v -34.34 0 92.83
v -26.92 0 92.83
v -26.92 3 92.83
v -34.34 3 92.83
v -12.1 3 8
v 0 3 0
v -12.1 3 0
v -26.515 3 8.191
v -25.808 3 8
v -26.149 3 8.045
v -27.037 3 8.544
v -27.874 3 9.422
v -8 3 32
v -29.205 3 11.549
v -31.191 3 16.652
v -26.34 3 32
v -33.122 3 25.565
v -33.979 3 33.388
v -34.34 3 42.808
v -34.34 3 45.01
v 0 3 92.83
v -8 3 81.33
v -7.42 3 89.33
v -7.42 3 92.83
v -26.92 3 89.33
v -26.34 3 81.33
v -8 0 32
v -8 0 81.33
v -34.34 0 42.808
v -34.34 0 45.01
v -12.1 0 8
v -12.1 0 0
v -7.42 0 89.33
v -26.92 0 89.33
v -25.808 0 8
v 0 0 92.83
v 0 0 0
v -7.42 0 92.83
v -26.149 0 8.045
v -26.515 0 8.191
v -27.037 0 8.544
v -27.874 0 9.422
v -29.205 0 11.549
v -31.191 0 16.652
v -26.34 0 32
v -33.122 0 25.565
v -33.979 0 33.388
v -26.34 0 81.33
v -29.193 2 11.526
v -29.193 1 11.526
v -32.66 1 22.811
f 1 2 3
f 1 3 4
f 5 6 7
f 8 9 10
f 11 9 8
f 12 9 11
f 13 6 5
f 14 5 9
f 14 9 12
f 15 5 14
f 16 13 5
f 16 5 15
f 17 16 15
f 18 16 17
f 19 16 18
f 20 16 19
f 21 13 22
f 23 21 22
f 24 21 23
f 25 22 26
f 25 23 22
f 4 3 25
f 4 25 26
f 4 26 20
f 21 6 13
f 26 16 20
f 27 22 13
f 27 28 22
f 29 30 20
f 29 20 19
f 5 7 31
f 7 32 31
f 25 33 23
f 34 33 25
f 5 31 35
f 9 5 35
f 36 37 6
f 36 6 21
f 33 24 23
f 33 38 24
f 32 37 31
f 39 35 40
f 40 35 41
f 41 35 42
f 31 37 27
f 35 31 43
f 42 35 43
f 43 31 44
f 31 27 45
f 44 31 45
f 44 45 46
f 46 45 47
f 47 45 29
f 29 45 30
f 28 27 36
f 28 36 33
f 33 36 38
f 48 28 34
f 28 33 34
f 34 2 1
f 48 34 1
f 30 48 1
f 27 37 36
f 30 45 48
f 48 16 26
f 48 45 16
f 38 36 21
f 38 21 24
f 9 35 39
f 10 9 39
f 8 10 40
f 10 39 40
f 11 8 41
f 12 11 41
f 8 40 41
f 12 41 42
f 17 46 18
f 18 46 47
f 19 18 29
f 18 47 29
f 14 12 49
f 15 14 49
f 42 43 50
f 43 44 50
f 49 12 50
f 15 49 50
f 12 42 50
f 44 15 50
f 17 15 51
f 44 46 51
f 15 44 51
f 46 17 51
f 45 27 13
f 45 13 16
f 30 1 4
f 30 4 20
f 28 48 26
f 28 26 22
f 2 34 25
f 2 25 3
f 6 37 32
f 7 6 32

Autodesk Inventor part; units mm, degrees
ref_plane "YZ Plane" through (0, 0, 0) normal (1, 0, 0) x (0, 1, 0)
ref_plane "XZ Plane" through (0, 0, 0) normal (0, 1, 0) x (-1, 0, 0)
ref_plane "XY Plane" through (0, 0, 0) normal (0, 0, 1) x (1, 0, 0)
sketch "Sketch1" plane through (0, 0, 0) normal (0, 1, 0) x (-1, 0, 0)
  line L0 (25.8082, 8) -> (28.6076, 7.9624) construction
  line L1 (0, 0) -> (0, 92.83)
  line L2 (0, 0) -> (12.1, 0)
  line L3 (26.34, 81.33) -> (8, 81.33)
  line L4 (8, 81.33) -> (8, 32)
  line L5 (8, 32) -> (26.34, 32)
  line L6 (26.34, 32) -> (26.34, 81.33)
  line L7 (0, 92.83) -> (7.42, 92.83)
  line L8 (7.42, 92.83) -> (7.42, 89.33)
  line L9 (7.42, 89.33) -> (26.92, 89.33)
  line L10 (26.92, 89.33) -> (26.92, 92.83)
  line L11 (26.92, 92.83) -> (34.34, 92.83)
  line L12 (34.34, 92.83) -> (34.34, 0)
  line L13 (34.34, 0) -> (12.1, 0)
  line L14 (12.1, 0) -> (12.1, 8)
  line L15 (12.1, 8) -> (34.34, 8)
  spline S0 degree 3 poles (25.8082, 8) (28.6076, 7.9624) (34.5101, 18.742) (34.34, 45.0104) knots 1 1 1 1 1.641396 1.641396 1.641396 1.641396
  line L16 (28.6076, 7.9624) -> (34.5101, 18.742) construction
  line L17 (34.5101, 18.742) -> (34.34, 45.0104) construction
  point P0 (25.8768, 44.3592)
  point P1 (17.17, 89.33)
  point P2 (25.8375, 8)
  point P3 (34.34, 42.8078)
  dimension "d8" = 92.83
  dimension "d9" = 12.1
  dimension "d10" = 7.42
  dimension "d11" = 7.42
  dimension "d12" = 8
  dimension "d13" = 8
  dimension "d14" = 8
  dimension "d15" = 19.5
  dimension "d16" = 3.5
  dimension "d17" = 32
  dimension "d18" = 8
extrude "Extrusion1" add sketch "Sketch1" along normal blind 3 contours L1 L7 L8 L9 L10 L11 L12 S0 L15 L14 L2
properties part number "C-D"
